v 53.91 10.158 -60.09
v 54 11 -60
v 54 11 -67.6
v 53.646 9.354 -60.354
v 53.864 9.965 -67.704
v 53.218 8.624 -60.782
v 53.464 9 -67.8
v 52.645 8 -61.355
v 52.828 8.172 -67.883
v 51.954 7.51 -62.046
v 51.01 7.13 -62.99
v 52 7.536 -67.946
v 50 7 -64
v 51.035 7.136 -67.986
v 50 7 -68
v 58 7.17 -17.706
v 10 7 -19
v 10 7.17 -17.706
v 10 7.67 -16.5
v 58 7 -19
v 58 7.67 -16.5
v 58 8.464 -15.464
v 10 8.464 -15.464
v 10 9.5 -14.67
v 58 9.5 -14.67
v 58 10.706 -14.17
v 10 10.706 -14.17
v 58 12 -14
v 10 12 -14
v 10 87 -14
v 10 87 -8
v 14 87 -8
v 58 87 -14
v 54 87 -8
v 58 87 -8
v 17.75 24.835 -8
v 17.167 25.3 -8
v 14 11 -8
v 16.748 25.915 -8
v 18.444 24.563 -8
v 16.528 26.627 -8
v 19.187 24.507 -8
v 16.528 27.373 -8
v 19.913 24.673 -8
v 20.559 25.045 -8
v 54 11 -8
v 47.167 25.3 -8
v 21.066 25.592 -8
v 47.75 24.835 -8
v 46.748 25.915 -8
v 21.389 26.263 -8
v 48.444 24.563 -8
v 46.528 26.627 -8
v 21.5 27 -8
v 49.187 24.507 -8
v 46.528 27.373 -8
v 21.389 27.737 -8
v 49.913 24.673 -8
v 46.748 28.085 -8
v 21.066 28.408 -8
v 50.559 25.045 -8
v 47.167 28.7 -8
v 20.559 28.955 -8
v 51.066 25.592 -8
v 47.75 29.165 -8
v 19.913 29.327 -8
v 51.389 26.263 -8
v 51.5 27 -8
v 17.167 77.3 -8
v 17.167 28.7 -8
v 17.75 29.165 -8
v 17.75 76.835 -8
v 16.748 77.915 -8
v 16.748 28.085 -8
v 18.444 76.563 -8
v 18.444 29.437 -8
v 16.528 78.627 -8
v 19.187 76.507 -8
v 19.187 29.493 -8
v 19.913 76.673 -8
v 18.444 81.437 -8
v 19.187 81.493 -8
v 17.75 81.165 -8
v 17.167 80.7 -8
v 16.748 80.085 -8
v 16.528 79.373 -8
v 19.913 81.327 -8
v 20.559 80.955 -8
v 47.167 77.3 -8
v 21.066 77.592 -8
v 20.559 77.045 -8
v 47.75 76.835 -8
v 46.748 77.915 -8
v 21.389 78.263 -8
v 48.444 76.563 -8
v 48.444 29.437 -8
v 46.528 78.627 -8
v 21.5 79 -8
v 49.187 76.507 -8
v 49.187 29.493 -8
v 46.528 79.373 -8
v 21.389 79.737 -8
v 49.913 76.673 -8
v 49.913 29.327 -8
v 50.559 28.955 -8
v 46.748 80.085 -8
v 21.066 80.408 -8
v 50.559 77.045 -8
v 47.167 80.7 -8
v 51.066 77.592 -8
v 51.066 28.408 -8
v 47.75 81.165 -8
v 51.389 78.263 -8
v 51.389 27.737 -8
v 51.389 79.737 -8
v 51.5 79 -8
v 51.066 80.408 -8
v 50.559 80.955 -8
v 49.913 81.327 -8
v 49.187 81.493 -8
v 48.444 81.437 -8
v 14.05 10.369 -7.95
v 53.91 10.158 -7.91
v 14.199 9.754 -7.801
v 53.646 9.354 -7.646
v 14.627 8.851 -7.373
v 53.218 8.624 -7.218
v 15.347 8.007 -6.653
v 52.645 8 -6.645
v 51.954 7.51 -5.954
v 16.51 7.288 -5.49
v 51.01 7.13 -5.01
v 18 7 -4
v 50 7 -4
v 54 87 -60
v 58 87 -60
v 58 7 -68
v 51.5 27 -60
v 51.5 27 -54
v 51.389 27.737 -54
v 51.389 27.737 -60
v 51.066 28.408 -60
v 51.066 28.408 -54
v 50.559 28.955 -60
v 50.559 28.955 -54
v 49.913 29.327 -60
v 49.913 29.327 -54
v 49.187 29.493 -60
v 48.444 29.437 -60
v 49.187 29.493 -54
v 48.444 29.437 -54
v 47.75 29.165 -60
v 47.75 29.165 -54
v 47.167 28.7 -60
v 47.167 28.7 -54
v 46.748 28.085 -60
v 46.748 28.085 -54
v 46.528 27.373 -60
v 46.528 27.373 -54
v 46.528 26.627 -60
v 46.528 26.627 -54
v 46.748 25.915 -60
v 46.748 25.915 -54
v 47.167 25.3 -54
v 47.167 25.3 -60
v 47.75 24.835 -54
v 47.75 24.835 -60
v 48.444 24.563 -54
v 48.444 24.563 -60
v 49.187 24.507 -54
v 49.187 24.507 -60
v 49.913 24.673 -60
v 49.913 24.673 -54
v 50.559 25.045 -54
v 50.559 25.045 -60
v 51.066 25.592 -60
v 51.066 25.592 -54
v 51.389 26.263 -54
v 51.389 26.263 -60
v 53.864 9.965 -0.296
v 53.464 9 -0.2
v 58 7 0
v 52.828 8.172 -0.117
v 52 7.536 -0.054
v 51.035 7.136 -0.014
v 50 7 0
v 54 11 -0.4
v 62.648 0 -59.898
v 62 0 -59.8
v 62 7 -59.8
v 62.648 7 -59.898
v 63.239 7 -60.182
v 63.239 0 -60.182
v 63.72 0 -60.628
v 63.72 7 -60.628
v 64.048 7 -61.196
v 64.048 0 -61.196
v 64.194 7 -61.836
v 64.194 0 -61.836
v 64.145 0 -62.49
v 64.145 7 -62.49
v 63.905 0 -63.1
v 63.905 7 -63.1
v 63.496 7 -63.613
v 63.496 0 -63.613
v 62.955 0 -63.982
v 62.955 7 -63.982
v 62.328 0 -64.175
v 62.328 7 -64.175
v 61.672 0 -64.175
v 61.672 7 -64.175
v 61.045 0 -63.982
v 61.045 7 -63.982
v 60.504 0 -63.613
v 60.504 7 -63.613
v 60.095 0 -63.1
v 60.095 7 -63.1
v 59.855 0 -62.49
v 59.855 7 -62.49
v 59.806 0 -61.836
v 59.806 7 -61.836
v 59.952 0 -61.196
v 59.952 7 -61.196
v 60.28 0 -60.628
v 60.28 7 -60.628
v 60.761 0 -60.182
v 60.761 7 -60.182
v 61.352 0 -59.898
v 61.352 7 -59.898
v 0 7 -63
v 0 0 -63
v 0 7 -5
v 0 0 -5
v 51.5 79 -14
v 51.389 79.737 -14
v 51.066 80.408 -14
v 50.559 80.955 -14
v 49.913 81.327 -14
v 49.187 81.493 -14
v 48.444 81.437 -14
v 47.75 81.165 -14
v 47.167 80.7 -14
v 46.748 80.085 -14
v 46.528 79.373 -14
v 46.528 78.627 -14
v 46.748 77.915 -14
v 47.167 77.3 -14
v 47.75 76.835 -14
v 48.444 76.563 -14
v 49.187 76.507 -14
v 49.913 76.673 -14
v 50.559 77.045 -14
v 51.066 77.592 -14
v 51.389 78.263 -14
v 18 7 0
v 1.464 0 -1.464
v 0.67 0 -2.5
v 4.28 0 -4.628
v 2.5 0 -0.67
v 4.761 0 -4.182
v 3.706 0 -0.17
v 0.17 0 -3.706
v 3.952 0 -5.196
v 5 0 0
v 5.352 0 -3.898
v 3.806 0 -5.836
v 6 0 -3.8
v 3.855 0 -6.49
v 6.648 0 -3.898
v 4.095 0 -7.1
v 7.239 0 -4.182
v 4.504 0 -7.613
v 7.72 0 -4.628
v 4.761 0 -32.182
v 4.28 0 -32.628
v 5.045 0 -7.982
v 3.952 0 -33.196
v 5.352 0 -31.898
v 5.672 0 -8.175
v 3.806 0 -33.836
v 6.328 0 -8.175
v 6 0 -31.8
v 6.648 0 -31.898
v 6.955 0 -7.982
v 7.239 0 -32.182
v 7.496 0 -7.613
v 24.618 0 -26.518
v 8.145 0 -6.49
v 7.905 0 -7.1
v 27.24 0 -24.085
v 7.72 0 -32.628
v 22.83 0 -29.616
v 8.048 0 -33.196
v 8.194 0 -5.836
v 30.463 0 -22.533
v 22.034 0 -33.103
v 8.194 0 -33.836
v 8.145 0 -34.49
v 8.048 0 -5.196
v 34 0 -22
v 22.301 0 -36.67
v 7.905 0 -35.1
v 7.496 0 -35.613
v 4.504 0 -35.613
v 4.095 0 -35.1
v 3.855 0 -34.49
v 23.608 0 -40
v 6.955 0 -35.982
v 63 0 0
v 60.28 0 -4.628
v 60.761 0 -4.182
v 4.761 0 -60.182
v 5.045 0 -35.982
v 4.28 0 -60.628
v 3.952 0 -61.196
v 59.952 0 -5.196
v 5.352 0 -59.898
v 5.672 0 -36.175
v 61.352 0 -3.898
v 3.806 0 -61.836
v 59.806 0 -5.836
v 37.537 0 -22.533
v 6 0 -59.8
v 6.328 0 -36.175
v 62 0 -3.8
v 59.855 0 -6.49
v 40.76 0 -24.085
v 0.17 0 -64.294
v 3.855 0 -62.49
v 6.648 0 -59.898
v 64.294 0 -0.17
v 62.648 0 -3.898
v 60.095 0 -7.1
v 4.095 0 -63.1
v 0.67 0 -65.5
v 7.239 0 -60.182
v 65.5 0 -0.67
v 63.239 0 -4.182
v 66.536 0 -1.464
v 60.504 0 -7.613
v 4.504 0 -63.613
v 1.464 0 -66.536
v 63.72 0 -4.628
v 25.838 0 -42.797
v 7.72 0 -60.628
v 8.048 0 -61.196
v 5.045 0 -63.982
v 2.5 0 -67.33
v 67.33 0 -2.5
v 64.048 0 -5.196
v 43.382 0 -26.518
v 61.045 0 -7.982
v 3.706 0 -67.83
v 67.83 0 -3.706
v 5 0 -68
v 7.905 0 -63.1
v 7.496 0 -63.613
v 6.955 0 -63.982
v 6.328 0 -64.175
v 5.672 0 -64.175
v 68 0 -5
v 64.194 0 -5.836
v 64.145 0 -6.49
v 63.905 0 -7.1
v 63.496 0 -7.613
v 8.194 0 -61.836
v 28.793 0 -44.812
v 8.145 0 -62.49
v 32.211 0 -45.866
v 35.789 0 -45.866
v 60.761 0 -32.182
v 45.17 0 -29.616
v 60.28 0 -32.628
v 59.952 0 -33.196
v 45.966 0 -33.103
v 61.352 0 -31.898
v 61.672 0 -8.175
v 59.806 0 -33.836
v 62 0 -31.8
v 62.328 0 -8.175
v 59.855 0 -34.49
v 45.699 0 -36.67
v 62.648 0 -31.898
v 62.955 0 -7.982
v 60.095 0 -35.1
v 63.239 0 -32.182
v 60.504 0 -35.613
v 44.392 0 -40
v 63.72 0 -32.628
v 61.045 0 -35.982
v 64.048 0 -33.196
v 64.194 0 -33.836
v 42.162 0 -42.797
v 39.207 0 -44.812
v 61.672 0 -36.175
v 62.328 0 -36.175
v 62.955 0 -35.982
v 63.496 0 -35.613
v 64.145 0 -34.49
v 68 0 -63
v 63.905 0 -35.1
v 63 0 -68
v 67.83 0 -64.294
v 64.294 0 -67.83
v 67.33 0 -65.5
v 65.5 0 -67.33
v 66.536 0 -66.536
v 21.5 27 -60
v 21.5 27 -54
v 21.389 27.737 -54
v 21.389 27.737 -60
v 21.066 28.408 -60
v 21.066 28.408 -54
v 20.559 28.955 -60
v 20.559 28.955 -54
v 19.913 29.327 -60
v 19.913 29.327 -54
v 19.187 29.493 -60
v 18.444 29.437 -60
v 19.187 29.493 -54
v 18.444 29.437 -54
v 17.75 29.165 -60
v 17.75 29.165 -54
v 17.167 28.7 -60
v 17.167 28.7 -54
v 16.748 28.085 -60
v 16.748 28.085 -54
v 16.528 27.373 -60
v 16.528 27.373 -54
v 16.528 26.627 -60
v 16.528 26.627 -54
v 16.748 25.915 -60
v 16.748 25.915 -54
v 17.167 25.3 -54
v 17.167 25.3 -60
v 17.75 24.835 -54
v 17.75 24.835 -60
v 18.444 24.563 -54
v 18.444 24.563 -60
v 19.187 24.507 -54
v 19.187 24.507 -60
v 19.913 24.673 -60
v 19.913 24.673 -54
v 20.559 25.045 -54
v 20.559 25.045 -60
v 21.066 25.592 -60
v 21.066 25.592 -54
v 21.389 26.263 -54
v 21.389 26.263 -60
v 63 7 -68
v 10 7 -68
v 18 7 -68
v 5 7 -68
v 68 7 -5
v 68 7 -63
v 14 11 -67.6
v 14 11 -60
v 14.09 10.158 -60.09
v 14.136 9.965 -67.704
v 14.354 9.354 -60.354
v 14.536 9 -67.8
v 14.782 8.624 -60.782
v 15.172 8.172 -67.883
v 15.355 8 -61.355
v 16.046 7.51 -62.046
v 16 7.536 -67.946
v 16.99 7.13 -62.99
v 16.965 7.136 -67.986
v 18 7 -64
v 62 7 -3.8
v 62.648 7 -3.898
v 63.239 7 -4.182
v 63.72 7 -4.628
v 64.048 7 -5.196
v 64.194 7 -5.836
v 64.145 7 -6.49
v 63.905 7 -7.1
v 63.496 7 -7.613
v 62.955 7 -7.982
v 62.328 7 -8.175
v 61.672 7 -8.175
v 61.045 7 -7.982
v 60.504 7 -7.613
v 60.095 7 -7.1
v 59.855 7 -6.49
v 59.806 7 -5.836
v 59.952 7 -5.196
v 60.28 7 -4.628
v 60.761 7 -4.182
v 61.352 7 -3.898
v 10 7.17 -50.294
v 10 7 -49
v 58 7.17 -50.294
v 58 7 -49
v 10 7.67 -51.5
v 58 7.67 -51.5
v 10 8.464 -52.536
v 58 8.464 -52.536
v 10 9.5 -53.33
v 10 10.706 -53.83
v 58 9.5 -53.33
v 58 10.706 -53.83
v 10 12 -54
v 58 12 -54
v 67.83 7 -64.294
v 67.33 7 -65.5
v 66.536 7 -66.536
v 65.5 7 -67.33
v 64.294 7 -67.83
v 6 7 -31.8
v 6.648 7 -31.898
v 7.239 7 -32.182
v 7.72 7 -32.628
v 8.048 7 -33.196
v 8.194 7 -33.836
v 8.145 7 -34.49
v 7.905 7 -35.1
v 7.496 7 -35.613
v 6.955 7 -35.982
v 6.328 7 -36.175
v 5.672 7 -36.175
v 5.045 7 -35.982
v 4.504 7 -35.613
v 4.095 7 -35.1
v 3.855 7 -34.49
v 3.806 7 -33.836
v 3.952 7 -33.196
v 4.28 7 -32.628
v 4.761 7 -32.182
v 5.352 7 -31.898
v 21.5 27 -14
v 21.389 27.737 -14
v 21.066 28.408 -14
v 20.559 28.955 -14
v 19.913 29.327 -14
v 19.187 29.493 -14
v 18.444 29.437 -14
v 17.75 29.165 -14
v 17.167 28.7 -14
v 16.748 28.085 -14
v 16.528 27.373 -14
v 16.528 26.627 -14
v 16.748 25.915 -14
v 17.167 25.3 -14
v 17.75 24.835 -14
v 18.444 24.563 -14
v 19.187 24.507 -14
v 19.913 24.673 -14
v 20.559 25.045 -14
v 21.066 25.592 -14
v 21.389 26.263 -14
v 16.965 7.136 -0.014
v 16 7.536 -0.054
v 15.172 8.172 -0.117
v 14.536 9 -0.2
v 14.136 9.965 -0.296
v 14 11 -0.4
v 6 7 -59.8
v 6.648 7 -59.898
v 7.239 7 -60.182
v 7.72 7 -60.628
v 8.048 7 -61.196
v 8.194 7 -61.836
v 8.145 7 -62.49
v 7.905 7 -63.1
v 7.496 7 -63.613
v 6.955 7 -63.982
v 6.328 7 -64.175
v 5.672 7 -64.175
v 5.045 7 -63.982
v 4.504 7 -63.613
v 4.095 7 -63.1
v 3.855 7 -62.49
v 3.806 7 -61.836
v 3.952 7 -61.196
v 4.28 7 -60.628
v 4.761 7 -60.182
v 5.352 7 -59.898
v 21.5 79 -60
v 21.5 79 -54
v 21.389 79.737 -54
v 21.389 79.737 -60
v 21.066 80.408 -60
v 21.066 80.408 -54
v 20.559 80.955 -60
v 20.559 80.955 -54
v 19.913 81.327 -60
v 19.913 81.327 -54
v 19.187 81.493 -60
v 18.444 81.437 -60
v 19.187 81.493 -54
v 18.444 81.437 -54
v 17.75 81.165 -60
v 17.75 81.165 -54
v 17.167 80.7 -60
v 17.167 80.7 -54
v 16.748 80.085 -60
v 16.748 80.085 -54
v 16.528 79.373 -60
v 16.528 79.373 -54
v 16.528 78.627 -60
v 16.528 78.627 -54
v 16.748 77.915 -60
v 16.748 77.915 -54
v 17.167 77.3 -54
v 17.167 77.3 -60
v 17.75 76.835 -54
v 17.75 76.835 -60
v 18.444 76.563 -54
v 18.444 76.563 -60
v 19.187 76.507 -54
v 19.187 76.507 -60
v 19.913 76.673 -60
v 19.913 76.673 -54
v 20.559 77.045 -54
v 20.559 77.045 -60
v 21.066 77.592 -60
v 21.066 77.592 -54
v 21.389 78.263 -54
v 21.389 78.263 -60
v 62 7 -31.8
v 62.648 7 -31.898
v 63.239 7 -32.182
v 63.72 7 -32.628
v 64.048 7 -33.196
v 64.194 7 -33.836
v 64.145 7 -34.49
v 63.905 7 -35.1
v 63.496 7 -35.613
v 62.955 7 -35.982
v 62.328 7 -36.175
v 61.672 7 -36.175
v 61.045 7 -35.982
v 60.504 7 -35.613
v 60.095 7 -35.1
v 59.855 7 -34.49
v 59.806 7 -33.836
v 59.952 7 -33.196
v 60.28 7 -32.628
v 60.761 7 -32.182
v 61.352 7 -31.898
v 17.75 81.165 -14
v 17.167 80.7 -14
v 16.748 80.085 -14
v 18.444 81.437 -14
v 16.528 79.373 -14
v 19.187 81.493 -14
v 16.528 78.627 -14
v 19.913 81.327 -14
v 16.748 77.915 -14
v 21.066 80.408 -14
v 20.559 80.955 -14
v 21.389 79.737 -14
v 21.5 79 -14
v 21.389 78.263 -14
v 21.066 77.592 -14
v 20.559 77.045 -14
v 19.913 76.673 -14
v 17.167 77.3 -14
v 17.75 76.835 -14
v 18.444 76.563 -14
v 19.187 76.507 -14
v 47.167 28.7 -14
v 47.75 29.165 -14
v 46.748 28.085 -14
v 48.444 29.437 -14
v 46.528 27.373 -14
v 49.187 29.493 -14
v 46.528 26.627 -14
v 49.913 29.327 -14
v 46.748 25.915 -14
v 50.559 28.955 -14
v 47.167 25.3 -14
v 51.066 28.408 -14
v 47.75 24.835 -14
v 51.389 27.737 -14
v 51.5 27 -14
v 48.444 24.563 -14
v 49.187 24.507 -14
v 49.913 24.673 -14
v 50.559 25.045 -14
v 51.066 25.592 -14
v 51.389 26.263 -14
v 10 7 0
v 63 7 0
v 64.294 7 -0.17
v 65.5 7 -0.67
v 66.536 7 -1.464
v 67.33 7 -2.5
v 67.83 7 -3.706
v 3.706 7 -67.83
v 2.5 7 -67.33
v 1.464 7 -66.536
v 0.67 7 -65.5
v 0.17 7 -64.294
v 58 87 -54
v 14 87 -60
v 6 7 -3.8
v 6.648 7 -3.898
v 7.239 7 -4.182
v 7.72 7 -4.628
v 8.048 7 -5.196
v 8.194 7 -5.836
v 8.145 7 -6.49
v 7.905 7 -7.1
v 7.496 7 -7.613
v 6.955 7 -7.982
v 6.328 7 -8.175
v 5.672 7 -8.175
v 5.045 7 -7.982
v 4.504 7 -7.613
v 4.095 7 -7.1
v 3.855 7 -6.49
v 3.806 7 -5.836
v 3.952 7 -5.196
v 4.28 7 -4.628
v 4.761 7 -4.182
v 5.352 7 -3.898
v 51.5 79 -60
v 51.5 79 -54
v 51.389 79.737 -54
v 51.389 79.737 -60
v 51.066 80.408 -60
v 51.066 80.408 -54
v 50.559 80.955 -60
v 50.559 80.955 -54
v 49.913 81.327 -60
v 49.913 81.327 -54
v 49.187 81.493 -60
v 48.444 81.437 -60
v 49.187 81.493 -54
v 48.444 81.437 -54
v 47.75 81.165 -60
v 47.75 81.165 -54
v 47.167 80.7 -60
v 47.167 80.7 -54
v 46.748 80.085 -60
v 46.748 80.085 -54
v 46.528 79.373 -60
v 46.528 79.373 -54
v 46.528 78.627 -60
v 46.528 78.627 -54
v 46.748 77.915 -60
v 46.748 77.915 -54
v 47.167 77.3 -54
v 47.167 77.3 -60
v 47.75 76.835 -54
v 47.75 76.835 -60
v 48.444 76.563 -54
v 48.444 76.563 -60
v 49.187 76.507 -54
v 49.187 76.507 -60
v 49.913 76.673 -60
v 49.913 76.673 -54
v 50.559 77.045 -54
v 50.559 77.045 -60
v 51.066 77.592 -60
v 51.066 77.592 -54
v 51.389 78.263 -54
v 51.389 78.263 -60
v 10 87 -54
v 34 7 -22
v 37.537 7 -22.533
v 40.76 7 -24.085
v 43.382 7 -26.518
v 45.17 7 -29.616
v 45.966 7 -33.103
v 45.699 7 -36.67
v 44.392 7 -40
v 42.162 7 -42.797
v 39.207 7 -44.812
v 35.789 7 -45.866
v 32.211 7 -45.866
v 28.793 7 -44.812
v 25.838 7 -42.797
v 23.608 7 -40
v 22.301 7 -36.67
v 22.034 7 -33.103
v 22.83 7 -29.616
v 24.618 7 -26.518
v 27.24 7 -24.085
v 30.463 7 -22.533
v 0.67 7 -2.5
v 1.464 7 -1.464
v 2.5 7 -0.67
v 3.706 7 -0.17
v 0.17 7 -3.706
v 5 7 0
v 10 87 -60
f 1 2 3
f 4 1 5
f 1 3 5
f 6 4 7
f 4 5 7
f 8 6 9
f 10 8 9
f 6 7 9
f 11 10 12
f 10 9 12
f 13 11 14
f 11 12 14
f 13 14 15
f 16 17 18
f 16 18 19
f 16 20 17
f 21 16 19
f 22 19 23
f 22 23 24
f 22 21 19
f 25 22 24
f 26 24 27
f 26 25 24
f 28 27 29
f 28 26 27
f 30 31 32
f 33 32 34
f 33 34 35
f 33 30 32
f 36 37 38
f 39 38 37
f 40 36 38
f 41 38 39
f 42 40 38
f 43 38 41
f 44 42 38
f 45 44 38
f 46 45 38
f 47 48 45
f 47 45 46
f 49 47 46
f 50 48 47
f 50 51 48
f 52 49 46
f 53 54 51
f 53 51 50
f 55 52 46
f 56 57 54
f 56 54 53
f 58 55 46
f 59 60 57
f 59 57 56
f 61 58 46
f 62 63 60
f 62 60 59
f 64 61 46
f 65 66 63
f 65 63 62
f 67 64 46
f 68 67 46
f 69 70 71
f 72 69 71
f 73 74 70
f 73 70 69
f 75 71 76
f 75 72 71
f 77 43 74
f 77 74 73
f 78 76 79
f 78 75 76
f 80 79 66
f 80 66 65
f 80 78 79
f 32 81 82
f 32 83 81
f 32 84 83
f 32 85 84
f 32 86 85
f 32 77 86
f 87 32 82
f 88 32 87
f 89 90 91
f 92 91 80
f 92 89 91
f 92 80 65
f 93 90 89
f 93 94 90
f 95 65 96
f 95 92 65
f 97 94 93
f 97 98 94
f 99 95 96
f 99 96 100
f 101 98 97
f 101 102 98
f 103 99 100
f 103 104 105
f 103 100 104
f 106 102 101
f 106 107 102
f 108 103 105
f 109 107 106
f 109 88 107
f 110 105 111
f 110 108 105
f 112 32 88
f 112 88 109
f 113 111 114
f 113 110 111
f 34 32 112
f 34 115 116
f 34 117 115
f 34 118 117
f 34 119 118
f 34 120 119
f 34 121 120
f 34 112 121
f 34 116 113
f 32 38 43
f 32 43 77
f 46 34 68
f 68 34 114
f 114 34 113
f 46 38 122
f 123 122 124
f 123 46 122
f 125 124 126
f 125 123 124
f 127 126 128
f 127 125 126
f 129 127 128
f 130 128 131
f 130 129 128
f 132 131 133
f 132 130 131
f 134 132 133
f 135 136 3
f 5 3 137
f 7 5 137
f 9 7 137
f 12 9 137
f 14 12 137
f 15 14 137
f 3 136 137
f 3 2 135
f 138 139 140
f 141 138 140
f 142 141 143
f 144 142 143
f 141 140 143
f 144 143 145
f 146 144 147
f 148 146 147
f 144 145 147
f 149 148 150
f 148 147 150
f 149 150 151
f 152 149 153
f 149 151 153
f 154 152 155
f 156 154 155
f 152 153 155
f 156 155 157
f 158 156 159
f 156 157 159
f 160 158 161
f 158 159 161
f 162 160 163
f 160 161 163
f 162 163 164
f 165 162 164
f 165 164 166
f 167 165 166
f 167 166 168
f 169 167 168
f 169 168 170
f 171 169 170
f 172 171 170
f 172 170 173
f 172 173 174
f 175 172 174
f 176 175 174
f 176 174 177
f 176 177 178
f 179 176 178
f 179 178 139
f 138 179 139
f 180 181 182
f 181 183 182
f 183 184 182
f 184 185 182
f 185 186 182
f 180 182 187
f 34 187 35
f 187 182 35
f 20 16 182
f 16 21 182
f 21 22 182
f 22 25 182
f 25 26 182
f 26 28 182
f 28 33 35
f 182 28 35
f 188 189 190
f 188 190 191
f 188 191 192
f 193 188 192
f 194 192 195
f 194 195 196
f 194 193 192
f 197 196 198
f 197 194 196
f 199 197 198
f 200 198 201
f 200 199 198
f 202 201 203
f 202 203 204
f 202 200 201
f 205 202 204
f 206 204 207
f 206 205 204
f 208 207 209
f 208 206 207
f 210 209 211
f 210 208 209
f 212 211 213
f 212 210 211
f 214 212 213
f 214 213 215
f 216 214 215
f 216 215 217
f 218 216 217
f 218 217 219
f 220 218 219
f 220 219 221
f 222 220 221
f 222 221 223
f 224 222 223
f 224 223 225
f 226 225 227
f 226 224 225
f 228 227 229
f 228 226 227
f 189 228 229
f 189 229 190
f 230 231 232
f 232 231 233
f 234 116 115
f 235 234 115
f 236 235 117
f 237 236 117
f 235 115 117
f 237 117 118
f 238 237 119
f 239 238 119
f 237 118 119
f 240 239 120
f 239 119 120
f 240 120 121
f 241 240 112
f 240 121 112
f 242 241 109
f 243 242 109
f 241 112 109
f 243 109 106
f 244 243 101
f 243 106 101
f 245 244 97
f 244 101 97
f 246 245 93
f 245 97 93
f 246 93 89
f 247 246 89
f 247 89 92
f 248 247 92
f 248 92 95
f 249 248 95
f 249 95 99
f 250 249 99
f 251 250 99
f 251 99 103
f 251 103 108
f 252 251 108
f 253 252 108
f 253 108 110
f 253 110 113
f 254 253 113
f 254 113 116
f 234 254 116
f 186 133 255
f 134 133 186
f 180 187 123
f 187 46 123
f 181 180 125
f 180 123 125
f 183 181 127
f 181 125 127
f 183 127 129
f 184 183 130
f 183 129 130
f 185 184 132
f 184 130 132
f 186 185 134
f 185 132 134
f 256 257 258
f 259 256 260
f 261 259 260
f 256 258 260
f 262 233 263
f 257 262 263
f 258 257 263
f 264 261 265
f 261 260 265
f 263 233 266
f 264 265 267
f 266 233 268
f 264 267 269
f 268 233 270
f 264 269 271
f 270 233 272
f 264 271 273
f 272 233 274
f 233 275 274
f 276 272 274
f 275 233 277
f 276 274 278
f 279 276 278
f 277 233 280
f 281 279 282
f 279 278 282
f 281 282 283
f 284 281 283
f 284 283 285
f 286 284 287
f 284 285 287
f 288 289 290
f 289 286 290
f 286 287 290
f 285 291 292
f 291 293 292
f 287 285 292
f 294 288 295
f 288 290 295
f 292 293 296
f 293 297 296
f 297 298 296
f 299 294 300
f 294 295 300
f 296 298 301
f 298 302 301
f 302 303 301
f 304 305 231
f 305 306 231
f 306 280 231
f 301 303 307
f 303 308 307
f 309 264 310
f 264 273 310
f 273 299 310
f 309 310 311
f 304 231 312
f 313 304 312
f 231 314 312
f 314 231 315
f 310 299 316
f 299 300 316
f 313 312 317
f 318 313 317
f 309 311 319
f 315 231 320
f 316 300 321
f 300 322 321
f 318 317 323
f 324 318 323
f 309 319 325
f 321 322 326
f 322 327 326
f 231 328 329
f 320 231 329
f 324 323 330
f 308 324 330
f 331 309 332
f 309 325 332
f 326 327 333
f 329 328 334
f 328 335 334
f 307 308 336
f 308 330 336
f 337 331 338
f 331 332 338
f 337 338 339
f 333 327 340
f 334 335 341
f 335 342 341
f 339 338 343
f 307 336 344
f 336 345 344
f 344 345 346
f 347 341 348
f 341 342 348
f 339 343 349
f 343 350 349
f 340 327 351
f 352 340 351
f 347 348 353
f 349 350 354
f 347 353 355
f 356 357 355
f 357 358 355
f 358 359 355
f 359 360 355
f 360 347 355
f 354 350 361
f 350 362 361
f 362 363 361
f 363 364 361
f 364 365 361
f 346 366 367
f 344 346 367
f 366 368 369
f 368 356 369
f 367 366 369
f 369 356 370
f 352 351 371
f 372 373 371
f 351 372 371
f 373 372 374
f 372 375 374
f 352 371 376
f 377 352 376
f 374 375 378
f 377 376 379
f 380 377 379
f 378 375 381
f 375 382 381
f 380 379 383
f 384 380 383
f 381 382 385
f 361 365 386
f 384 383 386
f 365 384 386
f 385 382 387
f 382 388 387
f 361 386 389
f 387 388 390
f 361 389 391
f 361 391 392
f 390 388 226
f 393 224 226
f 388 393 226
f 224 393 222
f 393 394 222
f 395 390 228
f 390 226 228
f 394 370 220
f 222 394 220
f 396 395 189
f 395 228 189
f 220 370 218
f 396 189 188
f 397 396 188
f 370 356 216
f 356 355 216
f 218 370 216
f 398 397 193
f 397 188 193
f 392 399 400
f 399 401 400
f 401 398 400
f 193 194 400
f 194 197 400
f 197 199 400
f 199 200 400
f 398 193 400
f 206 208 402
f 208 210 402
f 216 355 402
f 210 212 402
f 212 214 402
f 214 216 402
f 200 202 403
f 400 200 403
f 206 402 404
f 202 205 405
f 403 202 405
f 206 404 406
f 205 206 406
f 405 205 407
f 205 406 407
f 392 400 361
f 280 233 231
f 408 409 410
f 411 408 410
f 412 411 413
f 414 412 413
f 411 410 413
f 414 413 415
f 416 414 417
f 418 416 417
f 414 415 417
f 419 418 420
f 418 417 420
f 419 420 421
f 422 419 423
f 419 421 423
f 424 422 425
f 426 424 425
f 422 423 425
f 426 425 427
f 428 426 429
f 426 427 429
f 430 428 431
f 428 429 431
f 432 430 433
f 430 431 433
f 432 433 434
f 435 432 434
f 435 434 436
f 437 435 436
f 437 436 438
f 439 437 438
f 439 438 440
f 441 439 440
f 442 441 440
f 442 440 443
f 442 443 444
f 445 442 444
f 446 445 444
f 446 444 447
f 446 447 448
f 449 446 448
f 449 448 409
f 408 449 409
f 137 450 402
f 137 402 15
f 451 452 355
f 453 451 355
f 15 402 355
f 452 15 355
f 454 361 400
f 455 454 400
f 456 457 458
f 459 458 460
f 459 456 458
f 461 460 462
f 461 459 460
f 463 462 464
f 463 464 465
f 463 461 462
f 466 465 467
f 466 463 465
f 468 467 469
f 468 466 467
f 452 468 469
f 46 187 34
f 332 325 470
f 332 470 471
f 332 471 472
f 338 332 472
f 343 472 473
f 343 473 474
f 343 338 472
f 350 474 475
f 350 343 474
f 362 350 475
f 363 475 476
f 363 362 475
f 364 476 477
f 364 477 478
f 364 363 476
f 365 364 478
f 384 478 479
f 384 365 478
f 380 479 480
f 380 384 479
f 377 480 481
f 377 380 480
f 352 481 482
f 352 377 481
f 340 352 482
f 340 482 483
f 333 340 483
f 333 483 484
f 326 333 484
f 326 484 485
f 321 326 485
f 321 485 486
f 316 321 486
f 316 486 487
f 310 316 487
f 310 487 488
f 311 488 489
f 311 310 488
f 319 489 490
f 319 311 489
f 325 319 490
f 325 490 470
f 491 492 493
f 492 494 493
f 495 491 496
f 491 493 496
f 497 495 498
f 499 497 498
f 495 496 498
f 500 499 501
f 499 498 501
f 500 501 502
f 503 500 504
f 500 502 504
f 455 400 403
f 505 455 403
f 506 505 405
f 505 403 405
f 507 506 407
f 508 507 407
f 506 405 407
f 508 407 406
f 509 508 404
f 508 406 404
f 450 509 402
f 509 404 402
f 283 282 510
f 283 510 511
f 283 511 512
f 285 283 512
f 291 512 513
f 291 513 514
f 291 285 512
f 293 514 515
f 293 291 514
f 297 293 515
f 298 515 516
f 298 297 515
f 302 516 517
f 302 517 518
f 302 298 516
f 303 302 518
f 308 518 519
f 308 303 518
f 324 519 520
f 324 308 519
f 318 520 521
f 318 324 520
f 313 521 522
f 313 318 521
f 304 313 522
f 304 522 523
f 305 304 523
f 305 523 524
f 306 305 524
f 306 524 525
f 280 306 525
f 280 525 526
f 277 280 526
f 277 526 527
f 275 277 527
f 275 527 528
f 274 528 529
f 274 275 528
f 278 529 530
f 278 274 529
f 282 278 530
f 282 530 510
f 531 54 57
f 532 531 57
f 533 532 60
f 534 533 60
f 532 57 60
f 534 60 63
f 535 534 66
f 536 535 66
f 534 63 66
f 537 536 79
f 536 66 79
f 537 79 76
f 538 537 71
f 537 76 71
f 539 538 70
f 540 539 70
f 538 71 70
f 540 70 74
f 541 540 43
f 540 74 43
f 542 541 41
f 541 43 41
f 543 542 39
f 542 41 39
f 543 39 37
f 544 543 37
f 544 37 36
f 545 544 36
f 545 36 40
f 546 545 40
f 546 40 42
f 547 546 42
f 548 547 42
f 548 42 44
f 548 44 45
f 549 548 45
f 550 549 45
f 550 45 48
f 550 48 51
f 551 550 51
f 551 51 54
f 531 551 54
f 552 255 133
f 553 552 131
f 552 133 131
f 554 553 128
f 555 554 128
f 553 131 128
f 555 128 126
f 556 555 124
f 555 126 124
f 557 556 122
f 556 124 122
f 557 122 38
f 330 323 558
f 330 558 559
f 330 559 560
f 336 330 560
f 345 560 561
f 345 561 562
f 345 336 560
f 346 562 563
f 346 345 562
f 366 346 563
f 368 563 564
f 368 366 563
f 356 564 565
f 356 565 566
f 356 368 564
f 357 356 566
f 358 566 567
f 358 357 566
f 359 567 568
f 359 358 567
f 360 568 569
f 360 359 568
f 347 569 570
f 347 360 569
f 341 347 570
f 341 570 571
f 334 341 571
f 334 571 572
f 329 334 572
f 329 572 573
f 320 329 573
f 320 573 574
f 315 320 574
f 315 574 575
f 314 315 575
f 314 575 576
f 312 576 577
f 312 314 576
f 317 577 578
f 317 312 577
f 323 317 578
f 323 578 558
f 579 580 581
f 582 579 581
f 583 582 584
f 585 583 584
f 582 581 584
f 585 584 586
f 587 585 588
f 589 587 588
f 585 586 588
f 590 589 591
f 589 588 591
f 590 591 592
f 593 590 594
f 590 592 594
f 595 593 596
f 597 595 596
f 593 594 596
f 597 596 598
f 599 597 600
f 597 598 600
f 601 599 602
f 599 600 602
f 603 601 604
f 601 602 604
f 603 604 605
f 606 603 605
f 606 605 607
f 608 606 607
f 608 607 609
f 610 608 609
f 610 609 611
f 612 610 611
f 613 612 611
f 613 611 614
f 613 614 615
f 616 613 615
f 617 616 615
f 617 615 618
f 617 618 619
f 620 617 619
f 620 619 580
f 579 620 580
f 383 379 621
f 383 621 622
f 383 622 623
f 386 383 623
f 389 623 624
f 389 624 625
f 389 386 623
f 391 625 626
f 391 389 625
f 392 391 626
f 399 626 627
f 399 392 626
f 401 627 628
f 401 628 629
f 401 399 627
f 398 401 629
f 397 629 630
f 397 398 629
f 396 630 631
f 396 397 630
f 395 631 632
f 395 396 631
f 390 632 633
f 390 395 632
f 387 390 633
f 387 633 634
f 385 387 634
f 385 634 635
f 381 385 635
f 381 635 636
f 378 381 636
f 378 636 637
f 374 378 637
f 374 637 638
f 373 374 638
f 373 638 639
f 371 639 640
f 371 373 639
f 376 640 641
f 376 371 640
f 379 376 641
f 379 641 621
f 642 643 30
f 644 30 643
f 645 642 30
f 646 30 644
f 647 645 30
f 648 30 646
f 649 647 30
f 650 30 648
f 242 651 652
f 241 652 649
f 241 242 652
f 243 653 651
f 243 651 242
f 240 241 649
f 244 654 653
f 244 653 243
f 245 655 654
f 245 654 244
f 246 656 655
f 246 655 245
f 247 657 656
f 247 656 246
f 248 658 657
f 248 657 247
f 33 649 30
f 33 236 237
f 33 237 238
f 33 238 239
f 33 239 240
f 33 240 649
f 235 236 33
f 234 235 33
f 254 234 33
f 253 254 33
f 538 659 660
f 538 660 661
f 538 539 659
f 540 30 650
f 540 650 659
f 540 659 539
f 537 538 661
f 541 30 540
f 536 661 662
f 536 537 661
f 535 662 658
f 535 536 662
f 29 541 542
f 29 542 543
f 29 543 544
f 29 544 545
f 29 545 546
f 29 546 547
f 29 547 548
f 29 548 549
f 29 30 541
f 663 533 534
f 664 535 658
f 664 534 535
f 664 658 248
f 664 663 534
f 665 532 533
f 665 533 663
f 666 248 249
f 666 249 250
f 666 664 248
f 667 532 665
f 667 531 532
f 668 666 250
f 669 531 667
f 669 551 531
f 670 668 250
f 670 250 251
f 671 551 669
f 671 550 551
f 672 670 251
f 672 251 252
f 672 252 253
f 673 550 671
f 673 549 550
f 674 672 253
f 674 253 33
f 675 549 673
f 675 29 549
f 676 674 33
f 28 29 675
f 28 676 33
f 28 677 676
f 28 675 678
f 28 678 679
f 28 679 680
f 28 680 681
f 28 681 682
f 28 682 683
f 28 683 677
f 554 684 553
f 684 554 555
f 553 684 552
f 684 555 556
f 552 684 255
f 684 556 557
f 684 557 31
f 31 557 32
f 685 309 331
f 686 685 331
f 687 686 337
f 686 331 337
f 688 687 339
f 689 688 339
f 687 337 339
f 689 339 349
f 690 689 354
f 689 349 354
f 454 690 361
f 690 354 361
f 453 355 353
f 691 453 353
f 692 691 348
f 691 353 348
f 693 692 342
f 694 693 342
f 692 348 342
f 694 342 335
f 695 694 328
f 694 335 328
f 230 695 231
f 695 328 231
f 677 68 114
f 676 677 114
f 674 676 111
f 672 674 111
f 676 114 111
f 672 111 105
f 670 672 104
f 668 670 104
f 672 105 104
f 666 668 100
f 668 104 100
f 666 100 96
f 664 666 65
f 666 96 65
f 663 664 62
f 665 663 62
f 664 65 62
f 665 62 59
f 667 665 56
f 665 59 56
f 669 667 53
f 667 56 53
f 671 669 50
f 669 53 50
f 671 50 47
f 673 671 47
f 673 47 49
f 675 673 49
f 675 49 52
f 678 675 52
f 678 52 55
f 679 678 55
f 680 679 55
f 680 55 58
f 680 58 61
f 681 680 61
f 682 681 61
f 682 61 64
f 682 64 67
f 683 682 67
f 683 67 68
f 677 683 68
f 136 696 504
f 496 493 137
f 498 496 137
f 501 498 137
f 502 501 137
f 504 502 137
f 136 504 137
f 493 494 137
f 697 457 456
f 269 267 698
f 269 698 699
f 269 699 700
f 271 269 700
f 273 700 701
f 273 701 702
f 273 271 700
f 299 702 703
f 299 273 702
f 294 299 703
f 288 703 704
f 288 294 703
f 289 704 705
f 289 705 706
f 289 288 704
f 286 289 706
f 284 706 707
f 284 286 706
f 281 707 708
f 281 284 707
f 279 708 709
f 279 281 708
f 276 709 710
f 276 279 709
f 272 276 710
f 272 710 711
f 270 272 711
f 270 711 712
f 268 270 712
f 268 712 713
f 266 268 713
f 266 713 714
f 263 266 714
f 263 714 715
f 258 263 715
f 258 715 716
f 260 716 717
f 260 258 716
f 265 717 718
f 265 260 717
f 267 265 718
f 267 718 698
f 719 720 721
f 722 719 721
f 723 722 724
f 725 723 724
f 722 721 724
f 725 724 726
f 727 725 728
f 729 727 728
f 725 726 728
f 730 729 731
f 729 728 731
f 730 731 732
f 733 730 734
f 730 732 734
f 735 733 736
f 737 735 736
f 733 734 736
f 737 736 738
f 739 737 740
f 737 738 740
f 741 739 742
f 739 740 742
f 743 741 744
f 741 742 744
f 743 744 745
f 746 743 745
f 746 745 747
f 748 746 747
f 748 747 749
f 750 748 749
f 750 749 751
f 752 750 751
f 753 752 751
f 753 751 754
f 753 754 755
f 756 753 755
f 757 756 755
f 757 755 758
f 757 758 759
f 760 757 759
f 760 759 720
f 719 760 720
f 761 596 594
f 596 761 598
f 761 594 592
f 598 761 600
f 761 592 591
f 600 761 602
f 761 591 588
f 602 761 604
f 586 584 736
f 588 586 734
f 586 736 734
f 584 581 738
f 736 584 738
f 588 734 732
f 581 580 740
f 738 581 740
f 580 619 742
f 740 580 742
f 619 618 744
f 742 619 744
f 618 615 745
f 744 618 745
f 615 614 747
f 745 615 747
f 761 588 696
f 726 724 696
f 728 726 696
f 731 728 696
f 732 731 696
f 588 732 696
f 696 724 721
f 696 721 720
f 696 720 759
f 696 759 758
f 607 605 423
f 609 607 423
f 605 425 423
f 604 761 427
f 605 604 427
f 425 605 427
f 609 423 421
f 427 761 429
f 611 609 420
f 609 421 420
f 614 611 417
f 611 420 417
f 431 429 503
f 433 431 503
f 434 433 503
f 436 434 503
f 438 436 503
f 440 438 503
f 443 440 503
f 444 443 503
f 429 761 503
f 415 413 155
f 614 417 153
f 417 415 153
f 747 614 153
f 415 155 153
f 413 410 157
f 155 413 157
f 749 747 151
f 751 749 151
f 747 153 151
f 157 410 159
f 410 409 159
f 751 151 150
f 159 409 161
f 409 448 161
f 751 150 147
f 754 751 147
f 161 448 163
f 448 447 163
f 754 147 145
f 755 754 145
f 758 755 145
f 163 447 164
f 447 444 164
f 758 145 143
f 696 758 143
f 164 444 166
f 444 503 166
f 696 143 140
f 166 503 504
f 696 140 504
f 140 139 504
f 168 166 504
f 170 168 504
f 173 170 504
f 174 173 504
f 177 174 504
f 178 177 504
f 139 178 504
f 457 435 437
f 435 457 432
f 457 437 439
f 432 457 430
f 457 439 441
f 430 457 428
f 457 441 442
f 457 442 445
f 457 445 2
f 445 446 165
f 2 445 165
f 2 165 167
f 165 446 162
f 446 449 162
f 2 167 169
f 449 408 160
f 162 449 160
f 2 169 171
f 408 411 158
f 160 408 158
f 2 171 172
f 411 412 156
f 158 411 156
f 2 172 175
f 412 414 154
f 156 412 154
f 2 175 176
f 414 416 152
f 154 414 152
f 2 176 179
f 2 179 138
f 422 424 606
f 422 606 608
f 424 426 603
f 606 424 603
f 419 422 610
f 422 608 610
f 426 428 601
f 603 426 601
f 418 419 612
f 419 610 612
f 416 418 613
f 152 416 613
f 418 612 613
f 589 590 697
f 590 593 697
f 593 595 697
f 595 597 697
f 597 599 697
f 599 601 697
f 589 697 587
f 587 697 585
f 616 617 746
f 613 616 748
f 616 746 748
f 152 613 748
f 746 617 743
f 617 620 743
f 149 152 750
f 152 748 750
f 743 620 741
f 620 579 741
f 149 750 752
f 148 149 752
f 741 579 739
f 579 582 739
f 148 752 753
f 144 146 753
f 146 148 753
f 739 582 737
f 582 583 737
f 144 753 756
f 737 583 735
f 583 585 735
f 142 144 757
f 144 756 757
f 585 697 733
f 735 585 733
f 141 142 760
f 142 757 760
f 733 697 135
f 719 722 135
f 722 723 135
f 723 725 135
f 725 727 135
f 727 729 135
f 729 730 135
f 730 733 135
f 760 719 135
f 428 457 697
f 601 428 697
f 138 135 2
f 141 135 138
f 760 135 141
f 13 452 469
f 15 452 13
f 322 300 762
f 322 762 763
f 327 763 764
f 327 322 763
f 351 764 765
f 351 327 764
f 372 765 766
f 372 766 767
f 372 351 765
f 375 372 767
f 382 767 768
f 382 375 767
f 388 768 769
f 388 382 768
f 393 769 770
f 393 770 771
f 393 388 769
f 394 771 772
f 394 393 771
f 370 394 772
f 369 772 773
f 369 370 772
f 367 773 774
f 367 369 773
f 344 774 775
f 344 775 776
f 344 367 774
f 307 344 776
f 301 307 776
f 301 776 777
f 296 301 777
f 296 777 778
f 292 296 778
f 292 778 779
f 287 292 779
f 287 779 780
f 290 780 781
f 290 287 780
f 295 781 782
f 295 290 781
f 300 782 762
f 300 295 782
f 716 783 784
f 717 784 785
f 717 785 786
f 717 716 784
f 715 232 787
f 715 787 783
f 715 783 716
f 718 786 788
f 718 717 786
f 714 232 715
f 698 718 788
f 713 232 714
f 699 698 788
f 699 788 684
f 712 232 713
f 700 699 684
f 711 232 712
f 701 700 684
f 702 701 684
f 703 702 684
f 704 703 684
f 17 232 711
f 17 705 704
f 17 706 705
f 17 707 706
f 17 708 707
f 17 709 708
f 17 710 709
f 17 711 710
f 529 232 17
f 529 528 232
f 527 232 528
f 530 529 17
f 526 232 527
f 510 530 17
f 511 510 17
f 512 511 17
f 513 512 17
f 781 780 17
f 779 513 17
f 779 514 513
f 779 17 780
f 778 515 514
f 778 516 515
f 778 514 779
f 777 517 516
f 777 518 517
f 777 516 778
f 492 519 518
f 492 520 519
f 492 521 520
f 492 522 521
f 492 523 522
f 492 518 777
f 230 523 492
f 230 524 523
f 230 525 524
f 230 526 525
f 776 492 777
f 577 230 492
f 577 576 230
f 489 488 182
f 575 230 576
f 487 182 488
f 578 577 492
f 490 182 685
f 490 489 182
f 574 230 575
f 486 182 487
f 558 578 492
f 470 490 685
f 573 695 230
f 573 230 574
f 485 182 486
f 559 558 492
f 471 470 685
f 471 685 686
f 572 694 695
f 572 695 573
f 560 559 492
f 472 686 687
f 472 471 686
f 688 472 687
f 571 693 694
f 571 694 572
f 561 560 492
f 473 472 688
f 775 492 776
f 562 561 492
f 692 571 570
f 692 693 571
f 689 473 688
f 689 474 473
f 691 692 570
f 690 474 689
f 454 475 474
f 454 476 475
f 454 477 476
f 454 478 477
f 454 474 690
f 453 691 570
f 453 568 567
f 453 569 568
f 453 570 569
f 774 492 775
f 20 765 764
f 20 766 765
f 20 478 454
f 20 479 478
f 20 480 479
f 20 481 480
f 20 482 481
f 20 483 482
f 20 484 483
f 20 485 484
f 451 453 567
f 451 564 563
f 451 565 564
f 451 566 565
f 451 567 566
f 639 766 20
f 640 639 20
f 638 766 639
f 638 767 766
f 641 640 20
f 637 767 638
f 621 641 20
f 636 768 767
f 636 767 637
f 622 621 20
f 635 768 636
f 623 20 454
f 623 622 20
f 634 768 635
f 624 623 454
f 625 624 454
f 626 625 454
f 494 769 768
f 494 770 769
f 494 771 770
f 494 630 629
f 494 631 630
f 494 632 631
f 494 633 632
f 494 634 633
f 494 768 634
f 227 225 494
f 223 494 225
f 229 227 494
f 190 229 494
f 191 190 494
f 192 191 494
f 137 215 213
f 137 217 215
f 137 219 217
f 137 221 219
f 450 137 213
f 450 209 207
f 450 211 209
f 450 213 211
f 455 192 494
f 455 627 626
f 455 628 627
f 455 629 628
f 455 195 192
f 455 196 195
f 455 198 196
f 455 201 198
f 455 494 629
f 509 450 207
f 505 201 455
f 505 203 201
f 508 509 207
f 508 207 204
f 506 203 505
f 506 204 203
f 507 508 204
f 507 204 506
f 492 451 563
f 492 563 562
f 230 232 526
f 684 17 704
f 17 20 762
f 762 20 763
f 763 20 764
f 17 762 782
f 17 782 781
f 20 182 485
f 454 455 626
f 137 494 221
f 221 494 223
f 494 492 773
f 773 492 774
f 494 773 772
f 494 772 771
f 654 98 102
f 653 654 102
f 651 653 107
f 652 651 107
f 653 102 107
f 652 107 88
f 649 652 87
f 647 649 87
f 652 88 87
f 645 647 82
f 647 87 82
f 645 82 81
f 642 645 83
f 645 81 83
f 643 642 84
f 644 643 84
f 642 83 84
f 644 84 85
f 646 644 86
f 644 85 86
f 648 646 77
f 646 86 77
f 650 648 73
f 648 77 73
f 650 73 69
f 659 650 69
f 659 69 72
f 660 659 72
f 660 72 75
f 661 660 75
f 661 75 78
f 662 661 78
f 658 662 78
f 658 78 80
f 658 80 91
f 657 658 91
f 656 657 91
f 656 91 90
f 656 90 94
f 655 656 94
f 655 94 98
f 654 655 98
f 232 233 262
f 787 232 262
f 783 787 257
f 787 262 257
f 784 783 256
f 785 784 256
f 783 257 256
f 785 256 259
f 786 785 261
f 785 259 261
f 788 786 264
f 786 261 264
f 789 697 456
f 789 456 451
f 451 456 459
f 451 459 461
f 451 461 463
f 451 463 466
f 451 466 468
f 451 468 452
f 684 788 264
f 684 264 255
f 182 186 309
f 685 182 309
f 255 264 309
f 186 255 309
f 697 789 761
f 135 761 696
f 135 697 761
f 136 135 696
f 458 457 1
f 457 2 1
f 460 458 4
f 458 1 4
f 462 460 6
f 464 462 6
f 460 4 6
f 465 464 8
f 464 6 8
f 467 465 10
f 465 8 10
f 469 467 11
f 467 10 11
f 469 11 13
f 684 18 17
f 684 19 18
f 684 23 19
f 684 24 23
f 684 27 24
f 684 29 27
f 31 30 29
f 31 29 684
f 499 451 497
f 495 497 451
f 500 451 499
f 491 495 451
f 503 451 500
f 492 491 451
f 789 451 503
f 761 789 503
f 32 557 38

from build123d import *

# Parameters (mm, degrees)
SKETCH1_R           = 2.2
SKETCH1_R_2         = 12
BOSS_EXTRUDE1_DEPTH = 7
SKETCH2_W           = 48
SKETCH2_H           = 6
BOSS_EXTRUDE2_DEPTH = 80
BOSS_EXTRUDE3_DEPTH = 48
SKETCH5_W           = 40
SKETCH5_H           = 8
CUT_EXTRUDE1_DEPTH  = 80
SKETCH6_R           = 2.5
CUT_EXTRUDE2_DEPTH  = 80
FILLET1_R           = 5
FILLET5_R           = 4


with BuildPart() as part:
    # Sketch1 → Boss-Extrude1 (new body)
    with BuildSketch(Plane(origin=(0, 0, 0), x_dir=(1, 0, 0), z_dir=(0, 1, 0))):
        with BuildLine():
            Line((5, 0), (63, 0))
            ThreePointArc((63, 0), (66.535533906, 1.464466094), (68, 5))
            Line((68, 5), (68, 63))
            ThreePointArc((68, 63), (66.535533906, 66.535533906), (63, 68))
            Line((63, 68), (5, 68))
            ThreePointArc((5, 68), (1.464466094, 66.535533906), (0, 63))
            Line((0, 63), (0, 5))
            ThreePointArc((0, 5), (1.464466094, 1.464466094), (5, 0))
        make_face()
        with Locations(Location((6, 6, 0), (0, 0, 270))):
            Circle(SKETCH1_R, mode=Mode.SUBTRACT)
        with Locations(Location((62, 6, 0), (0, 0, 270))):
            Circle(SKETCH1_R, mode=Mode.SUBTRACT)
        with Locations(Location((62, 34, 0), (0, 0, 270))):
            Circle(SKETCH1_R, mode=Mode.SUBTRACT)
        with Locations(Location((62, 62, 0), (0, 0, 270))):
            Circle(SKETCH1_R, mode=Mode.SUBTRACT)
        with Locations(Location((6, 34, 0), (0, 0, 270))):
            Circle(SKETCH1_R, mode=Mode.SUBTRACT)
        with Locations(Location((6, 62, 0), (0, 0, 270))):
            Circle(SKETCH1_R, mode=Mode.SUBTRACT)
        with Locations(Location((34, 34, 0), (0, 0, 270))):
            Circle(SKETCH1_R_2, mode=Mode.SUBTRACT)
    extrude(amount=BOSS_EXTRUDE1_DEPTH)

    # Sketch2 → Boss-Extrude2 (add)
    with BuildSketch(Plane(origin=(0, 7, 0), x_dir=(1, 0, 0), z_dir=(0, 1, 0))):
        with Locations((34, 57)):
            Rectangle(SKETCH2_W, SKETCH2_H)
        with Locations((34, 11)):
            Rectangle(SKETCH2_W, SKETCH2_H)
    extrude(amount=BOSS_EXTRUDE2_DEPTH)

    # Sketch4 → Boss-Extrude3 (add)
    with BuildSketch(Plane(origin=(58, 0, 0), x_dir=(0, 0, -1), z_dir=(1, 0, 0))):
        Polygon((8, 7), (0, 7), (8, 87), align=None)
        Polygon((60, 7), (60, 87), (68, 7), align=None)
    extrude(amount=-BOSS_EXTRUDE3_DEPTH)

    # Sketch5 → Cut-Extrude1 (cut)
    with BuildSketch(Plane(origin=(0, 87, 0), x_dir=(1, 0, 0), z_dir=(0, 1, 0))):
        with Locations((34, 64)):
            Rectangle(SKETCH5_W, SKETCH5_H)
        with Locations((34, 4)):
            Rectangle(SKETCH5_W, SKETCH5_H)
    extrude(amount=-CUT_EXTRUDE1_DEPTH, mode=Mode.SUBTRACT)

    # Sketch6 → Cut-Extrude2 (cut)
    with BuildSketch(Plane.XY.offset(-8)):
        with Locations((19, 79)):
            Circle(SKETCH6_R)
        with Locations((49, 79)):
            Circle(SKETCH6_R)
        with Locations((19, 27)):
            Circle(SKETCH6_R)
        with Locations((49, 27)):
            Circle(SKETCH6_R)
    extrude(amount=-CUT_EXTRUDE2_DEPTH, mode=Mode.SUBTRACT)

    # Fillet1
    fillet1_edges = [part.edges().sort_by_distance(p)[0] for p in [
        (34, 7, -54),
        (34, 7, -14),
    ]]
    fillet(fillet1_edges, radius=FILLET1_R)

    # Fillet5
    fillet5_edges = [part.edges().sort_by_distance(p)[0] for p in [
        (14, 7, -64),
        (54, 7, -64),
        (34, 7, -60),
        (14, 7, -4),
        (34, 7, -8),
        (54, 7, -4),
    ]]
    fillet(fillet5_edges, radius=FILLET5_R)


solid = part.part
